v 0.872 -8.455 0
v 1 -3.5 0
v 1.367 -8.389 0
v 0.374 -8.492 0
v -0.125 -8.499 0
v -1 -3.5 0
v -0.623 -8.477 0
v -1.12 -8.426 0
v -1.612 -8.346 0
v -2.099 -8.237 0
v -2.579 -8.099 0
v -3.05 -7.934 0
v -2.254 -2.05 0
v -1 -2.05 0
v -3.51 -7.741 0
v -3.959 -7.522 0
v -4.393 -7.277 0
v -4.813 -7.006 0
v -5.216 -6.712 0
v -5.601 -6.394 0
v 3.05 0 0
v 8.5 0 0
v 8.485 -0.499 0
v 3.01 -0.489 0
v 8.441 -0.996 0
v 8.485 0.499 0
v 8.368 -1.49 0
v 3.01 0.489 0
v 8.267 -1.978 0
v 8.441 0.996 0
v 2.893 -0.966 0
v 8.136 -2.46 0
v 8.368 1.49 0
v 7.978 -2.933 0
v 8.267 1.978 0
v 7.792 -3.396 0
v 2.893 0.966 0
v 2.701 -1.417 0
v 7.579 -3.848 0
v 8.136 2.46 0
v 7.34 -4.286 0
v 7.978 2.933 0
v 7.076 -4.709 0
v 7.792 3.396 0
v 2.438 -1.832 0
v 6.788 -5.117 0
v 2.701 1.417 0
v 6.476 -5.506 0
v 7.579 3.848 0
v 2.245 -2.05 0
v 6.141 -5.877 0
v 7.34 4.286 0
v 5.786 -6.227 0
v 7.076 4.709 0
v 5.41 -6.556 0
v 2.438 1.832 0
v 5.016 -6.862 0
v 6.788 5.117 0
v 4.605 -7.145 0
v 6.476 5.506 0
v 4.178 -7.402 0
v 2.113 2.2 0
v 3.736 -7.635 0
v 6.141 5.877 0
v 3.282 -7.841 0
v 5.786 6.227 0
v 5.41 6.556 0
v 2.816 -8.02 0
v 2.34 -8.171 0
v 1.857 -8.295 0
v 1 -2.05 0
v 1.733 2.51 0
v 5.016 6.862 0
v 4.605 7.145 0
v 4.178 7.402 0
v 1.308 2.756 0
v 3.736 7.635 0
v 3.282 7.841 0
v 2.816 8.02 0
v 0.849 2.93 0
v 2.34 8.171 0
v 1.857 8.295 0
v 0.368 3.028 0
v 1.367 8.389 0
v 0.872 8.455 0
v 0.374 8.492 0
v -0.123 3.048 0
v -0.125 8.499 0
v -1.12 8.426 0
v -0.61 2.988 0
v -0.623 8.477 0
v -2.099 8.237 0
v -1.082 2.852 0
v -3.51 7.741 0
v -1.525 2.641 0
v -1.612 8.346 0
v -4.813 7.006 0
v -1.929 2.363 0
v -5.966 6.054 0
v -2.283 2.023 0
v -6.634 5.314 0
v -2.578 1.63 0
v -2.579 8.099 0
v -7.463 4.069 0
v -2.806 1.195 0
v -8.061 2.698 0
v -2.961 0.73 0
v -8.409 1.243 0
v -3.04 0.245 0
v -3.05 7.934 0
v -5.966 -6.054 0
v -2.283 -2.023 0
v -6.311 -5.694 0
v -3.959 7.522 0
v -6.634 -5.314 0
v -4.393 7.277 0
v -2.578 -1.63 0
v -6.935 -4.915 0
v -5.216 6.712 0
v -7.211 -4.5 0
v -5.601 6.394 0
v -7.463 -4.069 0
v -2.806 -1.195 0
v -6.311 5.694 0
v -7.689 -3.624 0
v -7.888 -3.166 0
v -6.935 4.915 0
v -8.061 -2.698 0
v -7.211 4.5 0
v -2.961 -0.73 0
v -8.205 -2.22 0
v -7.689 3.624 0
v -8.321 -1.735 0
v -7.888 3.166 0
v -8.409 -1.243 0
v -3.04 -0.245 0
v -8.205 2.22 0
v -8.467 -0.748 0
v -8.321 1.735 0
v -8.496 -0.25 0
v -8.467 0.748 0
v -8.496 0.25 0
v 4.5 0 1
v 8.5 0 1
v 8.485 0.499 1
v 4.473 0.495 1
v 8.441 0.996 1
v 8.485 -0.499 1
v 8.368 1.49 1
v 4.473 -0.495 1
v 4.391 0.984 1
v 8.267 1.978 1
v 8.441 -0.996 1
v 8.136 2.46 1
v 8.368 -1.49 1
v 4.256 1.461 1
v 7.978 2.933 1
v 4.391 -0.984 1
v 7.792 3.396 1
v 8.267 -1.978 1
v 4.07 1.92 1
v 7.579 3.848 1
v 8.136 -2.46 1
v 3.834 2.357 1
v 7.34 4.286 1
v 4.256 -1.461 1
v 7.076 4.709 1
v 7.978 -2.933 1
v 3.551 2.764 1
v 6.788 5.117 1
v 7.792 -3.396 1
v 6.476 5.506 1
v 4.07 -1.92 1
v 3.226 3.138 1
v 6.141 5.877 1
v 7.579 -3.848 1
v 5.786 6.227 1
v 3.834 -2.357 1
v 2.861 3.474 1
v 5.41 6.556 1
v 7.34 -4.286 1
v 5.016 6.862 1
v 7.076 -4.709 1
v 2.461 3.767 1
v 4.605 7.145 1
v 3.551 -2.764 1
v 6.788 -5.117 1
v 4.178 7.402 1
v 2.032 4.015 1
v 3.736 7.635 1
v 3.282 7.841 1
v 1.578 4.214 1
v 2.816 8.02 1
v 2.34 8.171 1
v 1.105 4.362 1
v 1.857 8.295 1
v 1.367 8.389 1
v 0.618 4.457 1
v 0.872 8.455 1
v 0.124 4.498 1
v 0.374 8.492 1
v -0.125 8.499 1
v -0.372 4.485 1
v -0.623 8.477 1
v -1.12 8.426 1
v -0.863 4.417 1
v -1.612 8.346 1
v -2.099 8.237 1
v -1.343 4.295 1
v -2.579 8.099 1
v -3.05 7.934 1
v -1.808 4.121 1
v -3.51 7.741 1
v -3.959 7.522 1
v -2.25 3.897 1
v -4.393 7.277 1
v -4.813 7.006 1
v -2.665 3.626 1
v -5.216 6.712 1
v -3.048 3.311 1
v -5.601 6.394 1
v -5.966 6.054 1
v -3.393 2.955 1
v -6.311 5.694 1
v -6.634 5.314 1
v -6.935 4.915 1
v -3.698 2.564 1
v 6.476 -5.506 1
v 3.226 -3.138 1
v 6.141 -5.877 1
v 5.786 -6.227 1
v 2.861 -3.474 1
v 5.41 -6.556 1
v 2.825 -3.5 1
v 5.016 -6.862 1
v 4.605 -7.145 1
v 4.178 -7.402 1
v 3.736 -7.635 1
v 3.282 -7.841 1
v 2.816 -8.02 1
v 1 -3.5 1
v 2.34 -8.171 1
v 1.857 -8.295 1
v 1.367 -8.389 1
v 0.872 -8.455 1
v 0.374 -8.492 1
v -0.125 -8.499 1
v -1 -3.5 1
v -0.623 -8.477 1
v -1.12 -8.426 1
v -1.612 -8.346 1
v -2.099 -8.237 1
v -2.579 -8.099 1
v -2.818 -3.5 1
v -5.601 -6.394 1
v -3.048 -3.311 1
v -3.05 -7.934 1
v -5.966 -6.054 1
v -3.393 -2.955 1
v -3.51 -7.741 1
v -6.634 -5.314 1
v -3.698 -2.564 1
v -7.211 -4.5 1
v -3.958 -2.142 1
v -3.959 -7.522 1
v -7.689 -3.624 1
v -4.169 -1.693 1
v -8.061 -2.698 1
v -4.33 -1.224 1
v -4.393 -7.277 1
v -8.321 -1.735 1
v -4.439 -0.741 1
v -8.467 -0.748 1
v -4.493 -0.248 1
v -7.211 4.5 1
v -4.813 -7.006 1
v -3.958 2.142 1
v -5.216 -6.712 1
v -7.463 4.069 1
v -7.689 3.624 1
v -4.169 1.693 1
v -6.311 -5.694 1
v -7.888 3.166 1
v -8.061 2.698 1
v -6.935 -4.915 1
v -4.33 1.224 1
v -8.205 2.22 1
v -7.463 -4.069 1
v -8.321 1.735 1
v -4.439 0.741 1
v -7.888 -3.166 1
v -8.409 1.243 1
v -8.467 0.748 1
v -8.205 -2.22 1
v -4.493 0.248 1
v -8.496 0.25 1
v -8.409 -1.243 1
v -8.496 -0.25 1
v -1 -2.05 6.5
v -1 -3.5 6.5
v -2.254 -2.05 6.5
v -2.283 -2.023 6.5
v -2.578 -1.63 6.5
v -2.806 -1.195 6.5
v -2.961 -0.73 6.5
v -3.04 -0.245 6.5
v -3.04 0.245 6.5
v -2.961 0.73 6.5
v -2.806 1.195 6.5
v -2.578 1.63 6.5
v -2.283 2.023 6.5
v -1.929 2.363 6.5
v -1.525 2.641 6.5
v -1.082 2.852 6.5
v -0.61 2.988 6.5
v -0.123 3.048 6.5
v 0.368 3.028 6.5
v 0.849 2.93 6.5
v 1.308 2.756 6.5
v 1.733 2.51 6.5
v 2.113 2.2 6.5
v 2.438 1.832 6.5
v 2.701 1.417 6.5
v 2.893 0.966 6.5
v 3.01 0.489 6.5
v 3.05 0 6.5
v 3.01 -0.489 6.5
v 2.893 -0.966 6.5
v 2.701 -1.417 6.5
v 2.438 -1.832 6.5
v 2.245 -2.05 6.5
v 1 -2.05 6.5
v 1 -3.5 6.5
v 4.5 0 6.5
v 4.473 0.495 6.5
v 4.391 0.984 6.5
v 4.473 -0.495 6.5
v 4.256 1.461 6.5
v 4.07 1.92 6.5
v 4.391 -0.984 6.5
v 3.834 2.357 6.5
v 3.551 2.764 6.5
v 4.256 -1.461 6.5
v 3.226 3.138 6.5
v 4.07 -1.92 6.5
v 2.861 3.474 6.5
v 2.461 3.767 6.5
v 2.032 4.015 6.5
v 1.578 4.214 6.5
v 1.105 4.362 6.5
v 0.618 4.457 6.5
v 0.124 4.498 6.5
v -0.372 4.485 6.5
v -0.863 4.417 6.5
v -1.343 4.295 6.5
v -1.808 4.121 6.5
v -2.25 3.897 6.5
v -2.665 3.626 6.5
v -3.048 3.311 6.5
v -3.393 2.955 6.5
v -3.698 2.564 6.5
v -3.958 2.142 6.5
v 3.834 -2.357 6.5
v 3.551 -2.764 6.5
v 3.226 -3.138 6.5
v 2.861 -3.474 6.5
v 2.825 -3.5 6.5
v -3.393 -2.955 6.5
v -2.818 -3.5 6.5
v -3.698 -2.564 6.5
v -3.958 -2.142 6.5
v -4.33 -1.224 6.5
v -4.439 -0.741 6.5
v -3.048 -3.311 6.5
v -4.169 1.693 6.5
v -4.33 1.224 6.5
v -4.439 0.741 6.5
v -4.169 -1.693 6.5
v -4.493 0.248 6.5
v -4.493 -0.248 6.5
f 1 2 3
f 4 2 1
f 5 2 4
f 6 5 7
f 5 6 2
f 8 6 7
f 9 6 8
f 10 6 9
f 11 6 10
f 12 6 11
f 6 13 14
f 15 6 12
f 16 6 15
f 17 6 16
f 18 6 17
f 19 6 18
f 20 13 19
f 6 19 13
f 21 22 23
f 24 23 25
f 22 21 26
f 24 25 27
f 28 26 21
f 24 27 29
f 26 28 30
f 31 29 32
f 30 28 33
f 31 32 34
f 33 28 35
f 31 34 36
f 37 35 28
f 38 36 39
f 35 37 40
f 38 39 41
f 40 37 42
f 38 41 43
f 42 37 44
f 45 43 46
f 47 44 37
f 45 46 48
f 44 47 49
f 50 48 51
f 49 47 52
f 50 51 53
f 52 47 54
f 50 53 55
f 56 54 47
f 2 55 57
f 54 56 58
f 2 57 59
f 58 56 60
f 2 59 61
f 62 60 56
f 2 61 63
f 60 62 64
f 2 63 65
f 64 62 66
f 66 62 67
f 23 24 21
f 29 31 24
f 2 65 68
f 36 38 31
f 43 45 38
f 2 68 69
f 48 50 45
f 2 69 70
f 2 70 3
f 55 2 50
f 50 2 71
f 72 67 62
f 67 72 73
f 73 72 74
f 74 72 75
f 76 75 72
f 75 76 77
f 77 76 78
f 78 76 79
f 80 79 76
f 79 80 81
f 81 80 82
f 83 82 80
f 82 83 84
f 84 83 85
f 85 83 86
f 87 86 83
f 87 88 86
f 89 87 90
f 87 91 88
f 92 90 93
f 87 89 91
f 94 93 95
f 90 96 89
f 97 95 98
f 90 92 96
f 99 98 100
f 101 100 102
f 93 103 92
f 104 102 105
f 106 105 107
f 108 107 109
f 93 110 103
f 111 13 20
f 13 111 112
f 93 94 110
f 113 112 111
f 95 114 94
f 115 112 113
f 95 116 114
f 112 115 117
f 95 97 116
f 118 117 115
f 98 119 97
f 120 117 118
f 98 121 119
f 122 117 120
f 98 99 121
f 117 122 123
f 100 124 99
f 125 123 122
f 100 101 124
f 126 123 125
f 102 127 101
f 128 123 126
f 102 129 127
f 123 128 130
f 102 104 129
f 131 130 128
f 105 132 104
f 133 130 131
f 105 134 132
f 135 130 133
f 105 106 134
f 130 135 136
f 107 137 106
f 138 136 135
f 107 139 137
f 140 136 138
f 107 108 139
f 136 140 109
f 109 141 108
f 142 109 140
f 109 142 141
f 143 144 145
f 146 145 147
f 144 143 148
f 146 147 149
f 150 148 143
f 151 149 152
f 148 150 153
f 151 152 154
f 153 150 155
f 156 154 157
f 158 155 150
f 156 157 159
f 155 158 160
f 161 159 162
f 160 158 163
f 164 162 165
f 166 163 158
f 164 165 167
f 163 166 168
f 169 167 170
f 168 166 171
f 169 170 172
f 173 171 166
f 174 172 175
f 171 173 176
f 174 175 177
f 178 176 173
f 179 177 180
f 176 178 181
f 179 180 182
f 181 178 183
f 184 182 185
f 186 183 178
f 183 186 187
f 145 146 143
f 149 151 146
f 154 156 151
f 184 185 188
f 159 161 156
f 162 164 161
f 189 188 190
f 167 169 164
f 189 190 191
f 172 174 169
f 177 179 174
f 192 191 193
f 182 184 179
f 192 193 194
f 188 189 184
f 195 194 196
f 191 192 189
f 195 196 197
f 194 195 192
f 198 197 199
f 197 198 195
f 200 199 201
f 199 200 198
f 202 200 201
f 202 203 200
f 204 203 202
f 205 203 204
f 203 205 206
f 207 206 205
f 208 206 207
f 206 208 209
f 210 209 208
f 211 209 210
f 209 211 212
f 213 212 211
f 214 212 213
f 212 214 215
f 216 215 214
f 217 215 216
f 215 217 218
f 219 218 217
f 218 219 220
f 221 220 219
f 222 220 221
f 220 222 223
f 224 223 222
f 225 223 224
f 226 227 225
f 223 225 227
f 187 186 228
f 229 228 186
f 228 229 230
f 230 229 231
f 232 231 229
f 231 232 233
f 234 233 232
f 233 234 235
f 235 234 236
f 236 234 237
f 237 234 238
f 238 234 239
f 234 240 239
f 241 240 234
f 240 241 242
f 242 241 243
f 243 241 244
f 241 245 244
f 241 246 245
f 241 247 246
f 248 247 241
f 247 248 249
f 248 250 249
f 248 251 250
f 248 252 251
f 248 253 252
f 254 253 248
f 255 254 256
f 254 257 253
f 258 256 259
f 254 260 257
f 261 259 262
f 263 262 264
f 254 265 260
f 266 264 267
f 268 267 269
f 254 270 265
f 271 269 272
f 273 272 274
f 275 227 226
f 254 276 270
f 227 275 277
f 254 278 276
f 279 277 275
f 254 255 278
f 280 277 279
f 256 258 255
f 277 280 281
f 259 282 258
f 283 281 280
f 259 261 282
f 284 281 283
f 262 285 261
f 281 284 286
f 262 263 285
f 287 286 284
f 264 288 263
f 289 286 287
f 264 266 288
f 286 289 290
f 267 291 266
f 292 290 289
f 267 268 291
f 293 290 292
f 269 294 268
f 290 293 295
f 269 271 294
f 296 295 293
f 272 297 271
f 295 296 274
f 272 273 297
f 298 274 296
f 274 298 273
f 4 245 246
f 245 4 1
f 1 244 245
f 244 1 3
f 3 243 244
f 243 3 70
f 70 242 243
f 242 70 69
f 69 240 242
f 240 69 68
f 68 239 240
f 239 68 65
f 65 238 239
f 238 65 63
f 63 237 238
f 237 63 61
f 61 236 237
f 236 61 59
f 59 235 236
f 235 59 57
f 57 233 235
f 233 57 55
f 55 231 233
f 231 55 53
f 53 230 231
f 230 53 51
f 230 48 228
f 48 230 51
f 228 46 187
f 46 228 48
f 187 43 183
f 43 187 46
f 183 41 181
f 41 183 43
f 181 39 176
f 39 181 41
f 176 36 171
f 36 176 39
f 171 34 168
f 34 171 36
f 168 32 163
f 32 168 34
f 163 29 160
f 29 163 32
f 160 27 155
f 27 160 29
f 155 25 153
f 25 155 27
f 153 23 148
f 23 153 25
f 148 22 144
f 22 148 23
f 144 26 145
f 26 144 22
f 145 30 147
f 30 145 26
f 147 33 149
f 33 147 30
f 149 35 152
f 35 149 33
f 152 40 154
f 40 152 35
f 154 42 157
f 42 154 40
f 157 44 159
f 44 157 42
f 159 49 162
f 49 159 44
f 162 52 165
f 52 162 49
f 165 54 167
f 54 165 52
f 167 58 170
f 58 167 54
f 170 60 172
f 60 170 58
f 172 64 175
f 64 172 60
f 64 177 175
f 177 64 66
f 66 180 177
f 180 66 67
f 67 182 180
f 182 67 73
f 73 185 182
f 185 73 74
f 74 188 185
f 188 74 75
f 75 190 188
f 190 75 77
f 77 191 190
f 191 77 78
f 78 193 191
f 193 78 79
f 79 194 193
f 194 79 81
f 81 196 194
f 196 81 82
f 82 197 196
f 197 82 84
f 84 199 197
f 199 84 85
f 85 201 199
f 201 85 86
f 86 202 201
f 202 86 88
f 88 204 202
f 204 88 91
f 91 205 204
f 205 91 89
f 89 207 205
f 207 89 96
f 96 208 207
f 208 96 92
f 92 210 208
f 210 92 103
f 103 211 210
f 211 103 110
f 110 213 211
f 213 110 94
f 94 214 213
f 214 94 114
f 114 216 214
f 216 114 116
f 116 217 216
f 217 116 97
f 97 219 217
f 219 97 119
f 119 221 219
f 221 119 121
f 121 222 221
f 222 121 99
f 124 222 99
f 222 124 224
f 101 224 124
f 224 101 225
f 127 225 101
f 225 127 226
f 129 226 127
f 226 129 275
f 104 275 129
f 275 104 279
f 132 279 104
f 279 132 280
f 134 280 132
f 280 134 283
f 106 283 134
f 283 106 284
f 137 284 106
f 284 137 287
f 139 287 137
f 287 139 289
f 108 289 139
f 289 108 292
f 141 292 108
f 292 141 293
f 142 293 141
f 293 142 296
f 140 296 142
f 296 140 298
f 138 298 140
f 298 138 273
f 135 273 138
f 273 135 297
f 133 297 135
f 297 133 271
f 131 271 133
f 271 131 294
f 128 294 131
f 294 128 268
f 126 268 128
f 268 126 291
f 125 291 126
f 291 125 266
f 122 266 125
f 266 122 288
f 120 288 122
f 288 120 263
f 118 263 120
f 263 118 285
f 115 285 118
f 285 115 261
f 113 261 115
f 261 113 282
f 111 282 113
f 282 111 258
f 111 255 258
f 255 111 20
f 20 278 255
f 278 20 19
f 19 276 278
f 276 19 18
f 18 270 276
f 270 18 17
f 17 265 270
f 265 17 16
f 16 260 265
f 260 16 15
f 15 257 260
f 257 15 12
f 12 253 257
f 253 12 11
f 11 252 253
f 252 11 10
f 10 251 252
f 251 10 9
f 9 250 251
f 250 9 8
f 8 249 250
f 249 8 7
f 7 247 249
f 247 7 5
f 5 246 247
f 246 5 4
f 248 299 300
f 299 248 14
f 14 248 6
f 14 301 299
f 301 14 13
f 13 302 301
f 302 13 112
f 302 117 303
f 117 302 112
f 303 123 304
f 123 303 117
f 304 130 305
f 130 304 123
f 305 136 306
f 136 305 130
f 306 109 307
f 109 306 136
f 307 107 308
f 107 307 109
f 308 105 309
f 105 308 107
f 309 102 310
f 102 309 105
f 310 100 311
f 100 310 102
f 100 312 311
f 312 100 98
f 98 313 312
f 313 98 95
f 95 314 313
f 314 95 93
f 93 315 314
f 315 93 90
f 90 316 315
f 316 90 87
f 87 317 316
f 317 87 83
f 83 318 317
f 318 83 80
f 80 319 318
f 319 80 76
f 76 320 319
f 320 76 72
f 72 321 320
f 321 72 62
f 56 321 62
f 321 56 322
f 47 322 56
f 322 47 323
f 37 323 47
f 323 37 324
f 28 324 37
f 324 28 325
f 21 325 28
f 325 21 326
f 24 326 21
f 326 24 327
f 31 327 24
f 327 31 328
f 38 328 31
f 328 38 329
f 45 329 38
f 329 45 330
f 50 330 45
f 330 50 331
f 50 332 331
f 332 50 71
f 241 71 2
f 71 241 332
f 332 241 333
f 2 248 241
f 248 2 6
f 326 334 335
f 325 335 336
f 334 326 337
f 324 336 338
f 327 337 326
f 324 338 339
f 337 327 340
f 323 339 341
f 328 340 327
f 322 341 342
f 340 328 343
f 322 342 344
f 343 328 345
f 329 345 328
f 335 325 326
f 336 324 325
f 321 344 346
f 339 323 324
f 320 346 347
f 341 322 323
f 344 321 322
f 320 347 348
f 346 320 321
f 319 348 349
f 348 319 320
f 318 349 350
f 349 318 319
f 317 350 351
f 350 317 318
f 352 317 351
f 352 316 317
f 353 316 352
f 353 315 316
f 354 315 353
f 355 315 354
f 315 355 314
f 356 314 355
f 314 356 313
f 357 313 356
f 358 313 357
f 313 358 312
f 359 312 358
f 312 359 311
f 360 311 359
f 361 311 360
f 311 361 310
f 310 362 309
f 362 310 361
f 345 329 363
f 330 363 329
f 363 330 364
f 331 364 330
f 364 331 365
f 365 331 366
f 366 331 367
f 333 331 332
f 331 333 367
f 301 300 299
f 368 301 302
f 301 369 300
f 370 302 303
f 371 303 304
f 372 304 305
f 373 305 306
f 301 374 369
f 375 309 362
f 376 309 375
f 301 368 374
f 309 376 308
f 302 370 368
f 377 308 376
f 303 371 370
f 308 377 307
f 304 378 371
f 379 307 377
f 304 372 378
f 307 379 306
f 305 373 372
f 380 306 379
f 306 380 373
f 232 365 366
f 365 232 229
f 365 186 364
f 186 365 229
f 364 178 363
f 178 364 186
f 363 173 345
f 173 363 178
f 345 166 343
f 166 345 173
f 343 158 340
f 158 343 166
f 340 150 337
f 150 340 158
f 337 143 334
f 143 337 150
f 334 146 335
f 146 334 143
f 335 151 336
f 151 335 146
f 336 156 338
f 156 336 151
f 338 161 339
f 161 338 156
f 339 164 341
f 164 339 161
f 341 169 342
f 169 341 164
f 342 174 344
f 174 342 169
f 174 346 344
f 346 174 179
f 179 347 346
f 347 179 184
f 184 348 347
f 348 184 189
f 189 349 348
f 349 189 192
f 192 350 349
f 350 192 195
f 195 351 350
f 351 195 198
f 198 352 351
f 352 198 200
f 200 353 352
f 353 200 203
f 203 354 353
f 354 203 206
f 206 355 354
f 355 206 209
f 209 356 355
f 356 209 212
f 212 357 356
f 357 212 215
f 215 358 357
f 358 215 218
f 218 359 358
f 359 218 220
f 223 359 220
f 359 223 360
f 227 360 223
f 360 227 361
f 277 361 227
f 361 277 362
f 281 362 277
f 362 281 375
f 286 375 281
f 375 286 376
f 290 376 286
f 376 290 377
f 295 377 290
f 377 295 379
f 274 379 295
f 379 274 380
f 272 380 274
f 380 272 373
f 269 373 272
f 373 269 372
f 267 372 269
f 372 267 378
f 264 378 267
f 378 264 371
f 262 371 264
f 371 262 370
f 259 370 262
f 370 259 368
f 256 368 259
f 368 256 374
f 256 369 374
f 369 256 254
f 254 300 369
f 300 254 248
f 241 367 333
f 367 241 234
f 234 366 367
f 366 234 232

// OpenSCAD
$fs=1/2;
$fa=1/2;
a=9;
b=8;
c=6.1;
d=5.1;
e=2;
module profile(a,b,c,d,e) {
  difference() {
    intersection() {
      circle(d=a);
      translate([-a/2,a/2-b])square([a,b]);
    }
    intersection() {
      circle(d=c);
      translate([-c/2,c/2-d])square([c,d]);
    }
    translate([-e/2,-a])square([e,a]);
  }
}
linear_extrude(height=1) difference(){
  circle(d=17);
  difference() {
    hull() profile(a,b,c,d,e);
    profile(a,b,c,d,e);
  }
}
linear_extrude(height=6.5)profile(a,b,c,d,e);
